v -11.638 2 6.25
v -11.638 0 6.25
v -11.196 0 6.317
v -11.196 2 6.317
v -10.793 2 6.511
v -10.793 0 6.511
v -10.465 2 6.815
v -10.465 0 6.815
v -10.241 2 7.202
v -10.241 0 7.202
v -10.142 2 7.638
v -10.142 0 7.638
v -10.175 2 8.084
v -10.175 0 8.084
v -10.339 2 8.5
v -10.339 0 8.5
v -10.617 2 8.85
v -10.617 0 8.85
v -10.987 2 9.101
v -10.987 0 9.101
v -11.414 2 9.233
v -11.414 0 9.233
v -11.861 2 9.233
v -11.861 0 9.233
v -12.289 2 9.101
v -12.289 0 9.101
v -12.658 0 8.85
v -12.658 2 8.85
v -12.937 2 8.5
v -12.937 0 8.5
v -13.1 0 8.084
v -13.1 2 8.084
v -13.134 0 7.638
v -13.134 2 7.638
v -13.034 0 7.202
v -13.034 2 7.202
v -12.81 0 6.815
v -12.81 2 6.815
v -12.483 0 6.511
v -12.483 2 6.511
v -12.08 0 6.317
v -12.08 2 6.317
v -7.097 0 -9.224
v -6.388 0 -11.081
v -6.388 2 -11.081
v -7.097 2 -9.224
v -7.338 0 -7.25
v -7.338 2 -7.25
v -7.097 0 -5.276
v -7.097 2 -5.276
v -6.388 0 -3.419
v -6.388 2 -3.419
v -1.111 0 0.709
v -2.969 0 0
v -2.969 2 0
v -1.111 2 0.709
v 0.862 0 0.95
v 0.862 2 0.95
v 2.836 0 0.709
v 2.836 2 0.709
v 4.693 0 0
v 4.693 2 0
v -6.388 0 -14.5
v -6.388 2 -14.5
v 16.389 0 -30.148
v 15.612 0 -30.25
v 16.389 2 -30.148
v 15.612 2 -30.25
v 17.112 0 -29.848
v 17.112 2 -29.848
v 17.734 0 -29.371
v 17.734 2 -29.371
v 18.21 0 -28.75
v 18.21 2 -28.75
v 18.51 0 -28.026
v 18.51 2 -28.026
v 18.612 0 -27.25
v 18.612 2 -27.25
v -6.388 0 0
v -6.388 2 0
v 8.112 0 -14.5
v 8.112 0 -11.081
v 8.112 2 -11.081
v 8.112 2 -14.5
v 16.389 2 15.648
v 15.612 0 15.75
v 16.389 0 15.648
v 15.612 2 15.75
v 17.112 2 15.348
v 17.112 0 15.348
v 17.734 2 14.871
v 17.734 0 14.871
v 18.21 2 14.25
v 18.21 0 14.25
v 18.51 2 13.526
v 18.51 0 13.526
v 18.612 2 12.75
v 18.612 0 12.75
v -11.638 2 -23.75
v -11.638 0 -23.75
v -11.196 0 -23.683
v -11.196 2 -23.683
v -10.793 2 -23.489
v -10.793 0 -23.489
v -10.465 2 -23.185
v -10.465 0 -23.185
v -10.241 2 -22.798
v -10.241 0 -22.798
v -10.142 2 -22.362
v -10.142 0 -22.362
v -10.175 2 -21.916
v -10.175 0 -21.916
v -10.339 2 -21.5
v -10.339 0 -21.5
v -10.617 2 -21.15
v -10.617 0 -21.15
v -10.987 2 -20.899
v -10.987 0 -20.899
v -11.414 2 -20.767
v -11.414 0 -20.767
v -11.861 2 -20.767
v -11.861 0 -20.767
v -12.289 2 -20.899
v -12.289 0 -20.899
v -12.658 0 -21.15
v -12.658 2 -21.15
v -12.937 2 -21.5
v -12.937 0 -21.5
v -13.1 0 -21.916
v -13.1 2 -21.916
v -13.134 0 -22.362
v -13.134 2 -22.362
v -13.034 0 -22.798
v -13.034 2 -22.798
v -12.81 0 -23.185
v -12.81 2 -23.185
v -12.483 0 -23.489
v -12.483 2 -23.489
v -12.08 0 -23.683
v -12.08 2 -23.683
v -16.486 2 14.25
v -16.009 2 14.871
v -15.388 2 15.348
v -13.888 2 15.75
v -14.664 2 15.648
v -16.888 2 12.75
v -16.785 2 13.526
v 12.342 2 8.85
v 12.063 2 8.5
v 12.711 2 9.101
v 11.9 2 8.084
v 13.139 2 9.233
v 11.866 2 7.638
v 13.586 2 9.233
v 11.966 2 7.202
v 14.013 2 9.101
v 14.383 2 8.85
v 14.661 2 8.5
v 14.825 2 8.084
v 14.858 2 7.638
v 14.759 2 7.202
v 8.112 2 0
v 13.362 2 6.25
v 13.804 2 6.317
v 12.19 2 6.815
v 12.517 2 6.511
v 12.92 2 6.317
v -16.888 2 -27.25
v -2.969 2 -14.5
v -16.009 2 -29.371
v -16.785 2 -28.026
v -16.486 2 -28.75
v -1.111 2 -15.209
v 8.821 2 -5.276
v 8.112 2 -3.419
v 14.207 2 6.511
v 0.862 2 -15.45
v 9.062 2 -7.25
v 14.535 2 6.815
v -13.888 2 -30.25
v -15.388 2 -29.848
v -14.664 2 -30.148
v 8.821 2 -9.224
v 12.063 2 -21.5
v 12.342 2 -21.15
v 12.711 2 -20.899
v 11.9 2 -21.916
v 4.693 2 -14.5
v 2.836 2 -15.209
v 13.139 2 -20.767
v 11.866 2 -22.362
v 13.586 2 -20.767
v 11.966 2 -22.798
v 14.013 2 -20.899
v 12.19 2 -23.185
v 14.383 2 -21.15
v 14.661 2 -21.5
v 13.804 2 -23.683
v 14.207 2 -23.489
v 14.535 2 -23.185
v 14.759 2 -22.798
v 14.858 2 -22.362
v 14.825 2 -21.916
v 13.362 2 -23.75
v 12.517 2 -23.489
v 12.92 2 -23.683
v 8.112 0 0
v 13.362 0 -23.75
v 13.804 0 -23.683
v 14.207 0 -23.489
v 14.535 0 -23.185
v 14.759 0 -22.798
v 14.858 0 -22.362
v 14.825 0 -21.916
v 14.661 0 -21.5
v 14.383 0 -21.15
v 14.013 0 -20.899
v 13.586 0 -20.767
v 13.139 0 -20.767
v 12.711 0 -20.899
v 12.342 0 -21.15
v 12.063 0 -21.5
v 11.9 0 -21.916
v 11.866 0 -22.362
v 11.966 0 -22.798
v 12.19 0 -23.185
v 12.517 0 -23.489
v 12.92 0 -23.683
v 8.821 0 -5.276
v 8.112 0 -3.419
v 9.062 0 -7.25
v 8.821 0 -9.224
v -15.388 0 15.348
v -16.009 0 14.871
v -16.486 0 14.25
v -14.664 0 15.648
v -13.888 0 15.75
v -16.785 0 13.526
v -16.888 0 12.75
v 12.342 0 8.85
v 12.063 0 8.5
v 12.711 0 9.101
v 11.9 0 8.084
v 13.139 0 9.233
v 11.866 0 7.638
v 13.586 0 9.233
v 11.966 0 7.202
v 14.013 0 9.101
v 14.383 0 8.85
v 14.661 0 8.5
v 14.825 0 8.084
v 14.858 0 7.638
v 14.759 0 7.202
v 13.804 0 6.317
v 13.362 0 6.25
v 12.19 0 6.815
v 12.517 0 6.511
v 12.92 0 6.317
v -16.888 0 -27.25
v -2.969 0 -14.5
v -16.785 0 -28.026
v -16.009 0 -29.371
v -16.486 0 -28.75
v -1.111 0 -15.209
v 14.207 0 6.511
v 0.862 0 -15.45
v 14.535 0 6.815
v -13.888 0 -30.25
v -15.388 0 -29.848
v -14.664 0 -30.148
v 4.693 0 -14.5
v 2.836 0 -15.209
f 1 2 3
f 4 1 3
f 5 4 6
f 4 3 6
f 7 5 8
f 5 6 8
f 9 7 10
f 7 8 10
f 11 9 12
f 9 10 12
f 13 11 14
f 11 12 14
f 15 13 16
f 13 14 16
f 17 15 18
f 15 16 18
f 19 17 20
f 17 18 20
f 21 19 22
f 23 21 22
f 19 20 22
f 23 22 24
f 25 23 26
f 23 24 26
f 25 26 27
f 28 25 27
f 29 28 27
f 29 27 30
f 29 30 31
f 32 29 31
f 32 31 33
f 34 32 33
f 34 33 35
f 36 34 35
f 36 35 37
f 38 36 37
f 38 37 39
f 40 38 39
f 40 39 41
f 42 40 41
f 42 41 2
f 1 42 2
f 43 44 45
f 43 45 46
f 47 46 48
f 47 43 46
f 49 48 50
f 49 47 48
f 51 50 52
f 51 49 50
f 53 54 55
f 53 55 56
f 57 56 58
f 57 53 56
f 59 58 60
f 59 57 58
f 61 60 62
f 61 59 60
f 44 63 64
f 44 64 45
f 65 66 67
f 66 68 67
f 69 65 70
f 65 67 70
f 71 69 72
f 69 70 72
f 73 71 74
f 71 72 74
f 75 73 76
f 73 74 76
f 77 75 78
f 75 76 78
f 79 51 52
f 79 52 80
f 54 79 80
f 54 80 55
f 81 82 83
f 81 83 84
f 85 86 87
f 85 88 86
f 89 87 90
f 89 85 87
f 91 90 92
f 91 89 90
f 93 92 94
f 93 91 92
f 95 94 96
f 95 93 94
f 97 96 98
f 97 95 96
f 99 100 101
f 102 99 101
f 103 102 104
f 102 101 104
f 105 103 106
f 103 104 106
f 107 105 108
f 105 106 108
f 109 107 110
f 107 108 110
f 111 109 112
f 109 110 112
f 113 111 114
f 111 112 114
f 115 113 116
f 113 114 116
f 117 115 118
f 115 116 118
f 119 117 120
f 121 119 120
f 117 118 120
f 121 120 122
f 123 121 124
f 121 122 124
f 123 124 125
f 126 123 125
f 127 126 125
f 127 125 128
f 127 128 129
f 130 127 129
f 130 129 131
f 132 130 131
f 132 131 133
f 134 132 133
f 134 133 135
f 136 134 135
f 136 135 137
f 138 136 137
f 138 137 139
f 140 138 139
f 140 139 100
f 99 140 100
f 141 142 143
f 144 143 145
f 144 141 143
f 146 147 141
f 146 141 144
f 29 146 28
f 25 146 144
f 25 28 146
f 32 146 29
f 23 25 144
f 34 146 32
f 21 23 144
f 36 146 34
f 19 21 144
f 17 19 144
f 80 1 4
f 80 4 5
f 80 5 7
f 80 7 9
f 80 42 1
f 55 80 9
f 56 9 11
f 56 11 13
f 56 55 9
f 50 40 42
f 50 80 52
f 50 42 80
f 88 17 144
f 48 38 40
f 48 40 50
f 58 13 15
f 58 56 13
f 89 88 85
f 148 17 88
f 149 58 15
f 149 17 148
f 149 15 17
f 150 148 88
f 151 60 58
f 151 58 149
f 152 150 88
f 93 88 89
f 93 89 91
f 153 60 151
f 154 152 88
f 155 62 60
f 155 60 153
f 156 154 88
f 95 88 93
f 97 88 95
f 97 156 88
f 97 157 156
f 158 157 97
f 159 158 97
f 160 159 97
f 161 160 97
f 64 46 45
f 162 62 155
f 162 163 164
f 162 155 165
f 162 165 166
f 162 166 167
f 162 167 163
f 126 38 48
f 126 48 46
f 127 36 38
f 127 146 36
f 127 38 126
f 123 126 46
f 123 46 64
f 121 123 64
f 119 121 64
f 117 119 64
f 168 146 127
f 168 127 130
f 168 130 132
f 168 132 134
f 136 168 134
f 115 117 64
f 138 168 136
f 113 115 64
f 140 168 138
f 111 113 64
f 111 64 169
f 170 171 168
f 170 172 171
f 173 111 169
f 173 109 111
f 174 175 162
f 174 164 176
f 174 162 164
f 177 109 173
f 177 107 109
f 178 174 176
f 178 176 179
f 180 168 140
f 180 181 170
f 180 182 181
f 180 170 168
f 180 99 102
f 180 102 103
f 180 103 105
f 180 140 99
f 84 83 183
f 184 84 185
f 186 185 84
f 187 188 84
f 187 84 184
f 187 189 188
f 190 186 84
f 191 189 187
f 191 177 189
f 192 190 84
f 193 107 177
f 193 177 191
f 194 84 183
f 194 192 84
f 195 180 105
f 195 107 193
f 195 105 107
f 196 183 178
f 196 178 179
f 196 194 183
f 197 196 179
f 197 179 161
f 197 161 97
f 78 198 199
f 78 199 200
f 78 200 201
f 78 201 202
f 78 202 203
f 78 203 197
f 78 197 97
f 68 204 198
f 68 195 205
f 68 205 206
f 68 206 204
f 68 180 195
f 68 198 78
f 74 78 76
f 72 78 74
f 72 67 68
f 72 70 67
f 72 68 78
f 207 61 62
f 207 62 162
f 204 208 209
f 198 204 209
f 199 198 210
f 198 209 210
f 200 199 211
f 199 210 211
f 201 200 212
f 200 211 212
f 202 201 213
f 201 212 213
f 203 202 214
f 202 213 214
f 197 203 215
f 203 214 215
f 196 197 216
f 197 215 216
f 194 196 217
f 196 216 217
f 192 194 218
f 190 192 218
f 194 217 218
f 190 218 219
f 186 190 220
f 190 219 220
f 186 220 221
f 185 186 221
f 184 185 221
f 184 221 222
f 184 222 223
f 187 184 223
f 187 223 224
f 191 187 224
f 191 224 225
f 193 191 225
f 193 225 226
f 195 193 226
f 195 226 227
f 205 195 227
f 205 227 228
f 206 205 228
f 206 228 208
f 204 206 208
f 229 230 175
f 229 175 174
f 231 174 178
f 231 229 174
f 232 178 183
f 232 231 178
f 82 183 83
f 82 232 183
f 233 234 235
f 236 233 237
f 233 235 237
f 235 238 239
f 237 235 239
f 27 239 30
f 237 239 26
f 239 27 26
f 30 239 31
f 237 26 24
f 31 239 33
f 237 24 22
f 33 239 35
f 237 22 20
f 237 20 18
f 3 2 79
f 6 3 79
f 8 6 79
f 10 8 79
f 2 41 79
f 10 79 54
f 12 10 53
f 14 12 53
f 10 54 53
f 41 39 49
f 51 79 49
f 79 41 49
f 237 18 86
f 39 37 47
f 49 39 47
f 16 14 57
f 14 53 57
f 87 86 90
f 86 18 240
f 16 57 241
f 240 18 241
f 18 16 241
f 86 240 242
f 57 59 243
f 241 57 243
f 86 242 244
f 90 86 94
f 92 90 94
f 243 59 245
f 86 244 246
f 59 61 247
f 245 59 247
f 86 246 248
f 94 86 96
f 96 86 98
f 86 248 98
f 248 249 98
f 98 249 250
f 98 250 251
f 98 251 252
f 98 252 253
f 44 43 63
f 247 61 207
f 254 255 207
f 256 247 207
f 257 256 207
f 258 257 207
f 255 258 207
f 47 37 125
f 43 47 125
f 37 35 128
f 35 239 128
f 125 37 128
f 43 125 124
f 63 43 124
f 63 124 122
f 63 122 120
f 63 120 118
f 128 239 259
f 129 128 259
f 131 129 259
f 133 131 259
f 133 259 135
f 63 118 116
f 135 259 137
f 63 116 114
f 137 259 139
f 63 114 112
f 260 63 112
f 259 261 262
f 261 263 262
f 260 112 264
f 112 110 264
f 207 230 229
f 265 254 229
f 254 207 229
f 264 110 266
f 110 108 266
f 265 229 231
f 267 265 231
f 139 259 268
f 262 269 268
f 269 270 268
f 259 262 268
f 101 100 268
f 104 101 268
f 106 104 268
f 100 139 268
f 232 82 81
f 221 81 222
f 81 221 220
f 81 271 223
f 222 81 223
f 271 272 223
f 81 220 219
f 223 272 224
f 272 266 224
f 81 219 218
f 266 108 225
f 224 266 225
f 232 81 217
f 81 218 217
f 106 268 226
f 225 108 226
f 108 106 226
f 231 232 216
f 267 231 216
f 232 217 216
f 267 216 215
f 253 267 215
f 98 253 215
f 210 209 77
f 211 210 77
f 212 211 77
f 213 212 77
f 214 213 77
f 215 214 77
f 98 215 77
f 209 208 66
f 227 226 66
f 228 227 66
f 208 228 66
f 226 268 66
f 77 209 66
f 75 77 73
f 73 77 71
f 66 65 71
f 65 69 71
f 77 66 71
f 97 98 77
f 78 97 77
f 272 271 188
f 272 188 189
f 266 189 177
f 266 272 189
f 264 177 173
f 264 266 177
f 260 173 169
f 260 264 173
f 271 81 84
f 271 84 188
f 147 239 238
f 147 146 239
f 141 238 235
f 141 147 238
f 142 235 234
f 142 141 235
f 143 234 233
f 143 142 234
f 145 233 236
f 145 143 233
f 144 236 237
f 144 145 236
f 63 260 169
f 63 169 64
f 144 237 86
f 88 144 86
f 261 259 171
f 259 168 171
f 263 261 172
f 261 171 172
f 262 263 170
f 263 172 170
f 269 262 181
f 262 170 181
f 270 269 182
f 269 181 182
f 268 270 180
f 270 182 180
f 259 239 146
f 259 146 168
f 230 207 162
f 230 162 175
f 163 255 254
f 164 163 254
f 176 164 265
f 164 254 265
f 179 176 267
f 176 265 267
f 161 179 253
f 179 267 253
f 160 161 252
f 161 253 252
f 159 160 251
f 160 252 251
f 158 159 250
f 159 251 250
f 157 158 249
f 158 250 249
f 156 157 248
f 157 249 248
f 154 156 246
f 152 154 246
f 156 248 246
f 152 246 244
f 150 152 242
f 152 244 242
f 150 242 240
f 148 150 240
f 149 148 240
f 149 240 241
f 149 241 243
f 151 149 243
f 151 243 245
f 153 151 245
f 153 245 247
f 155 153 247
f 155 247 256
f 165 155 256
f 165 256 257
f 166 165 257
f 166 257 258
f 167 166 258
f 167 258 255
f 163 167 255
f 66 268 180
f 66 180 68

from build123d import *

# Parameters (mm, degrees)
SKETCH_1_W          = 35.5
SKETCH_1_H          = 46
EXTRUDE_1_DEPTH     = 2
FILLET_2_R          = 3
SKETCH_3_R          = 1.5
CUT_EXTRUDE_1_DEPTH = 10


with BuildPart() as part:
    # 草图1 → 凸台-拉伸1 (new body)
    with BuildSketch(Plane(origin=(0, 0, 0), x_dir=(1, 0, 0), z_dir=(0, 1, 0))):
        with Locations((0.862287952, 7.25)):
            Rectangle(SKETCH_1_W, SKETCH_1_H)
        with BuildLine():
            Line((-6.387712048, 3.418877449), (-6.387712048, 0))
            Line((-6.387712048, 0), (-2.968834599, 0))
            ThreePointArc((-2.968834599, 0), (0.862287952, -0.95), (4.693410503, 0))
            Line((4.693410503, 0), (8.112287952, 0))
            Line((8.112287952, 0), (8.112287952, 3.418877449))
            ThreePointArc((8.112287952, 3.418877449), (9.062287952, 7.25), (8.112287952, 11.081122551))
            Line((8.112287952, 11.081122551), (8.112287952, 14.5))
            Line((8.112287952, 14.5), (4.693410503, 14.5))
            ThreePointArc((4.693410503, 14.5), (0.862287952, 15.45), (-2.968834599, 14.5))
            Line((-2.968834599, 14.5), (-6.387712048, 14.5))
            Line((-6.387712048, 14.5), (-6.387712048, 11.081122551))
            ThreePointArc((-6.387712048, 11.081122551), (-7.337712048, 7.25), (-6.387712048, 3.418877449))
        make_face(mode=Mode.SUBTRACT)
    extrude(amount=EXTRUDE_1_DEPTH)

    # 圆角2
    fillet_2_edges = [part.edges().sort_by_distance(p)[0] for p in [
        (-16.887712048, 1, -30.25),
        (18.612287952, 1, -30.25),
        (18.612287952, 1, 15.75),
        (-16.887712048, 1, 15.75),
    ]]
    fillet(fillet_2_edges, radius=FILLET_2_R)

    # 草图3 → 切除-拉伸1 (cut)
    with BuildSketch(Plane.XZ):
        with Locations(Location((-11.637712048, 7.75, 0), (0, 0, 270))):
            Circle(SKETCH_3_R)
        with Locations(Location((-11.637712048, -22.25, 0), (0, 0, 270))):
            Circle(SKETCH_3_R)
        with Locations(Location((13.362287952, -22.25, 0), (0, 0, 270))):
            Circle(SKETCH_3_R)
        with Locations(Location((13.362287952, 7.75, 0), (0, 0, 270))):
            Circle(SKETCH_3_R)
    extrude(amount=-CUT_EXTRUDE_1_DEPTH, mode=Mode.SUBTRACT)


solid = part.part
